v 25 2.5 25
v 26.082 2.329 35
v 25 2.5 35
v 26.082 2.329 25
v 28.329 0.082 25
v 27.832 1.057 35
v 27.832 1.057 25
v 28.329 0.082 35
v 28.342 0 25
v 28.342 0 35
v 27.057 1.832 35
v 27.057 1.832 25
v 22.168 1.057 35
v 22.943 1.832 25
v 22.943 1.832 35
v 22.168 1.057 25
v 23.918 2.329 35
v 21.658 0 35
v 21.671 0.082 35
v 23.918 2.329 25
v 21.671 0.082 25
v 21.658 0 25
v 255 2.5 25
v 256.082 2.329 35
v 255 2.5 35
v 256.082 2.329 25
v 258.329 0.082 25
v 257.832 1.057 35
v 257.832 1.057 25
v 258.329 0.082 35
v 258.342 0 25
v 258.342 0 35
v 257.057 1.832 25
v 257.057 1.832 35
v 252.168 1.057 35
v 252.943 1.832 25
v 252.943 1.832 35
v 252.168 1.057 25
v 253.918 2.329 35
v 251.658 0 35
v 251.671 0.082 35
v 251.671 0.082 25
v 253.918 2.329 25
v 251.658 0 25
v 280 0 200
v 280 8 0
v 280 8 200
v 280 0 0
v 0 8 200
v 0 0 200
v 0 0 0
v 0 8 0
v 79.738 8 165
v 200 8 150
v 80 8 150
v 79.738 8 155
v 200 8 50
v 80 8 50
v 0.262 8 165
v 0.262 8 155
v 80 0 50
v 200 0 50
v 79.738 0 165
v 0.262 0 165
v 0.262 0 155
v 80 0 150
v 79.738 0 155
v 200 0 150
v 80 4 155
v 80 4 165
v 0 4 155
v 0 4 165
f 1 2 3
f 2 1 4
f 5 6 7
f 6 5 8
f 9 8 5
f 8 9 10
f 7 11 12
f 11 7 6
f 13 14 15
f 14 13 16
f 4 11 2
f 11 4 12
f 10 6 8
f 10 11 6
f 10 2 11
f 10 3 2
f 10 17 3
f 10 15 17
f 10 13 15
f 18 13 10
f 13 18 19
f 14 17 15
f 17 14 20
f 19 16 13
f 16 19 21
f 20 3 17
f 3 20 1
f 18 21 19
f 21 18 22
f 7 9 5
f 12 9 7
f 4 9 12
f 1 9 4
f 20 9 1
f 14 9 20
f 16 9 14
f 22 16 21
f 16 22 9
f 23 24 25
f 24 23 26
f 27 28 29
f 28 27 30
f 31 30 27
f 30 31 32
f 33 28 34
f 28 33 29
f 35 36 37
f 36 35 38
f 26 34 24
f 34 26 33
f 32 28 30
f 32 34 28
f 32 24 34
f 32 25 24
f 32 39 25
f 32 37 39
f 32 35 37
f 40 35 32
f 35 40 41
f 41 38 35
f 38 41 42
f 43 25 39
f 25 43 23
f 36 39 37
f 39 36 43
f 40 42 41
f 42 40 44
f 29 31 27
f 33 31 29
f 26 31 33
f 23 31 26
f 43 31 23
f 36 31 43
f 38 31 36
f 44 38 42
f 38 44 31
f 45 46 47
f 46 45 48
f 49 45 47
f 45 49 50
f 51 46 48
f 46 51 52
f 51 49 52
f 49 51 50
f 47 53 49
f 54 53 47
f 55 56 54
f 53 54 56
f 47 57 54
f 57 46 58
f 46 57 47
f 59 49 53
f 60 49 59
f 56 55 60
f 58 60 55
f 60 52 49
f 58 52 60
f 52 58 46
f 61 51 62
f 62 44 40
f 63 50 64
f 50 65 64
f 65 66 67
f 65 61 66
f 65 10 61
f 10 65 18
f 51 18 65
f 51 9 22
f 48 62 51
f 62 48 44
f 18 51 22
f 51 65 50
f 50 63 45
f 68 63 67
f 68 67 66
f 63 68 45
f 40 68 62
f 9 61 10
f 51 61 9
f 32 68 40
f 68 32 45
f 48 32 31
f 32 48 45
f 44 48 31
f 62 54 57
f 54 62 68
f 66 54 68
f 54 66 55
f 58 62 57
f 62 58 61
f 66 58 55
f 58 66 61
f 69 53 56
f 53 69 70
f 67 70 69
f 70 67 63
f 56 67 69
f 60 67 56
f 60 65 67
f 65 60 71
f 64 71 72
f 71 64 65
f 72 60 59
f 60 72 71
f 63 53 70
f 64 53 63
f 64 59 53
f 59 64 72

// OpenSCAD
// file: lib/generated_constants.scad
// AUTO-GENERATED from simulation/sizing.py — do not hand edit
P_target_W = 10.0;
A_mem_m2 = 0.72;
active_w = 200.0;
active_h = 300.0;
n_plates = 12;
housing_od = 280.0;
housing_len = 264;
bolt_circle = 240.0;
frame_L = 664;
frame_W = 480.0;
frame_H = 900;
delta_P_bar = 34.58;
plate_pitch = 12;
// main file
// CHORUS-SGH-1 — feed pump + prefilter mount plate
include <lib/generated_constants.scad>

module pump_mount() {
  plate_w = 280;
  plate_h = 200;
  plate_t = 8;
  difference() {
    cube([plate_w, plate_t, plate_h]);
    // pump footprint
    translate([plate_w/2, plate_t/2, plate_h/2])
      cube([120, plate_t+2, 100], center=true);
    translate([40, plate_t/2, plate_h-40])
      cylinder(h=plate_t+2, d=80, center=true, $fn=48);
    for (x = [25, plate_w-25])
      translate([x, -1, 25])
        cylinder(h=plate_t+2, d=7, $fn=20);
  }
}

module pump_mount_part() { pump_mount(); }
pump_mount_part();
